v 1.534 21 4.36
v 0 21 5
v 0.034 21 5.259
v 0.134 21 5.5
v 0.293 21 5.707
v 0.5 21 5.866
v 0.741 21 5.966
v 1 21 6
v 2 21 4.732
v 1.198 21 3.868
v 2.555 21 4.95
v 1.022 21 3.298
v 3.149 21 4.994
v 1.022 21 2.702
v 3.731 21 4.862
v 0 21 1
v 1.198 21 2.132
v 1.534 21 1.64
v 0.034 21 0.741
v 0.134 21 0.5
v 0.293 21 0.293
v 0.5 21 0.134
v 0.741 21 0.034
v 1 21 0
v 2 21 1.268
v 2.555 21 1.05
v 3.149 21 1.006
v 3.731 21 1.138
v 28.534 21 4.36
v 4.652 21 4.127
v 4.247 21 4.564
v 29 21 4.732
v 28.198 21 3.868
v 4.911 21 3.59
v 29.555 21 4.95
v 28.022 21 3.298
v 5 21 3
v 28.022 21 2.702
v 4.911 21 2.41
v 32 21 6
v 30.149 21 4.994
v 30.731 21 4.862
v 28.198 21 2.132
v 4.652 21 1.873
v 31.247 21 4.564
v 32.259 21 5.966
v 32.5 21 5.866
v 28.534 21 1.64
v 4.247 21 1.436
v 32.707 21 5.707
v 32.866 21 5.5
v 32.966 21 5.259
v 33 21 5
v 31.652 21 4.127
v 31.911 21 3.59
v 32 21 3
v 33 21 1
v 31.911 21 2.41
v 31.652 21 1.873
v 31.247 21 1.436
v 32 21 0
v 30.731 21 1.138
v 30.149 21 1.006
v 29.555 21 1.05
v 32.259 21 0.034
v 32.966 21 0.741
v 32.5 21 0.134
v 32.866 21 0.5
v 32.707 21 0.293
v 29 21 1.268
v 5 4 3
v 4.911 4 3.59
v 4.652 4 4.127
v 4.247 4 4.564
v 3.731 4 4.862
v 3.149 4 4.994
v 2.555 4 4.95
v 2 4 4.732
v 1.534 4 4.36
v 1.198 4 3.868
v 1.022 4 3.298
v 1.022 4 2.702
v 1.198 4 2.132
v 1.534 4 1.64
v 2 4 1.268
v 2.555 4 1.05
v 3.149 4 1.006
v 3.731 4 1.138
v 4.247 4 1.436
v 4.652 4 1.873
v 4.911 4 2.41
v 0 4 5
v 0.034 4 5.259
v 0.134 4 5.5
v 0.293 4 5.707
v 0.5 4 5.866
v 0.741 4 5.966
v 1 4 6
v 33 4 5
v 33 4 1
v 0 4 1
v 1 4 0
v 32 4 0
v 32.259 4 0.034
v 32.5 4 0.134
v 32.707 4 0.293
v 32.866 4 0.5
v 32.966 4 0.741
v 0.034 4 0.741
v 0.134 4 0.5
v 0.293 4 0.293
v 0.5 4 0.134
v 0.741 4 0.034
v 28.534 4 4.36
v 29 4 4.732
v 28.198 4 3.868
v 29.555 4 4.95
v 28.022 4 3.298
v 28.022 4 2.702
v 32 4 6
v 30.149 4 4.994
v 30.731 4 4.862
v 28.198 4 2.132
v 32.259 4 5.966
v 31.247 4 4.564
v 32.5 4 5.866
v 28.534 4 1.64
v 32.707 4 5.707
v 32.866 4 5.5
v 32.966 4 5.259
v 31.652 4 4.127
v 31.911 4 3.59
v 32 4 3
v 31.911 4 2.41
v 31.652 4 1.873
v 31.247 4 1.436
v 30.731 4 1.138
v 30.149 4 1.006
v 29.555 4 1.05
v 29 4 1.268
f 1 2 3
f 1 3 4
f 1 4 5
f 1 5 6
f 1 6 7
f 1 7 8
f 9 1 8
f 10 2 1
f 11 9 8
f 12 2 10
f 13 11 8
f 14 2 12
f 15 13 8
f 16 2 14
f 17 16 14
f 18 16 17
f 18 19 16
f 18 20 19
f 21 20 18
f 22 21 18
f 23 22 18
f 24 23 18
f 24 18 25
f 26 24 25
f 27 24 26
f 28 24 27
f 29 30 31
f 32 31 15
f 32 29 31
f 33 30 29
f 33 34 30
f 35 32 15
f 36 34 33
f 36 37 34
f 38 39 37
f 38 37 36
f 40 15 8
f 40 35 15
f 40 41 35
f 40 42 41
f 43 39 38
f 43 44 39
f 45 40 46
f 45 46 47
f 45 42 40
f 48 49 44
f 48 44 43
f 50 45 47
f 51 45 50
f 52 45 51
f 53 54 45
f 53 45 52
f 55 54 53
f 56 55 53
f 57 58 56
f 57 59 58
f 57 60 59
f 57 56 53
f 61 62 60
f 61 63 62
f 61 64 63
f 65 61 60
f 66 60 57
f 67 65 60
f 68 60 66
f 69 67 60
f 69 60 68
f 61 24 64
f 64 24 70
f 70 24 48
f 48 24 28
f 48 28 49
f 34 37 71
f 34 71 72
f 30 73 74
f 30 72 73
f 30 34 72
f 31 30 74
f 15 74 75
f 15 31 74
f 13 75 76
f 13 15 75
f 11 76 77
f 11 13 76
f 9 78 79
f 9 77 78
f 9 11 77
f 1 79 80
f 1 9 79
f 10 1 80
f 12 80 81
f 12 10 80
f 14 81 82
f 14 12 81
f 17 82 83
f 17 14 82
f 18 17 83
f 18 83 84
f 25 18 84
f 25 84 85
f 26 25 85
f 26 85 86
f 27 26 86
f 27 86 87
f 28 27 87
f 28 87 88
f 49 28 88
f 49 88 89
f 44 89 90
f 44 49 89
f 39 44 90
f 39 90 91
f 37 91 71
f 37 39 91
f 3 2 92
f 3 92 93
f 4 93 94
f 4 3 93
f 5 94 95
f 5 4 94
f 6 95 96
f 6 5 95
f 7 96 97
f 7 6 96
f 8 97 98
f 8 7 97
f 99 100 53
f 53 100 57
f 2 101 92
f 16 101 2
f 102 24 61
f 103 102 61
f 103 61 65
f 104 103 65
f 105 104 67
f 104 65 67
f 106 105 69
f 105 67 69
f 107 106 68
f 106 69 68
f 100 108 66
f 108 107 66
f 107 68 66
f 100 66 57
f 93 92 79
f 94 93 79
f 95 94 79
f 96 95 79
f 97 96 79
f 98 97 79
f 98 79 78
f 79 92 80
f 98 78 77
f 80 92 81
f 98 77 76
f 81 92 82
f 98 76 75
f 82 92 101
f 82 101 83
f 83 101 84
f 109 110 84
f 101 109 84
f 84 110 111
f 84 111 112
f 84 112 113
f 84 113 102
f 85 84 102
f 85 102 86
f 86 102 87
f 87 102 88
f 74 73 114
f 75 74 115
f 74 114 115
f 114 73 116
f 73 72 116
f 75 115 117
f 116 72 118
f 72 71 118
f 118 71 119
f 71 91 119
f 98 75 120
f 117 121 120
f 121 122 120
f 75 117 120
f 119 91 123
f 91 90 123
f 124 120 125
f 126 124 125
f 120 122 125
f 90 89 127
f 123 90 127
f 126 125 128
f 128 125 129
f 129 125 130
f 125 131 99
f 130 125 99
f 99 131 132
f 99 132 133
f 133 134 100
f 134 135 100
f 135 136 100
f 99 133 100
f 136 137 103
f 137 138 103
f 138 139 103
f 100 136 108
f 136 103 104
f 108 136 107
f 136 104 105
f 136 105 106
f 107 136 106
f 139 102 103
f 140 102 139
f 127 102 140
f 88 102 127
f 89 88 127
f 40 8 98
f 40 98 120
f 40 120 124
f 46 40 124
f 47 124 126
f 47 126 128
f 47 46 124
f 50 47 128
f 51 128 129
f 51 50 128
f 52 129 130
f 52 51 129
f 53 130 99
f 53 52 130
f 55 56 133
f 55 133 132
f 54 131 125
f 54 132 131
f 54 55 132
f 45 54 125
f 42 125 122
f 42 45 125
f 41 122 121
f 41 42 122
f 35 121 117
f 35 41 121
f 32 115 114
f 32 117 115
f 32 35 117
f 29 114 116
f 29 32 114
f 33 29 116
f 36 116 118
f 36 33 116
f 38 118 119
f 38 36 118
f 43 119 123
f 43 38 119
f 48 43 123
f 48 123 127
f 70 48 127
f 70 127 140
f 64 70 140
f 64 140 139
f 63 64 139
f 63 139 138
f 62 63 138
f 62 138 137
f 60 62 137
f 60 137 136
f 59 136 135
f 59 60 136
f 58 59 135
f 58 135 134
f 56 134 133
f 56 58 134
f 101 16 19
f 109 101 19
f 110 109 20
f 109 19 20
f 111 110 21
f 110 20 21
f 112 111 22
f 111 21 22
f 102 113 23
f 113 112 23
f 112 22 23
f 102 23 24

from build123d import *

# Parameters (mm, degrees)
BOX001_W               = 50
BOX001_H               = 4
BOX001_DEPTH           = 10
CYLINDER002_R          = 2
CYLINDER002_DEPTH      = 30
CYLINDER002_ROLL_ANGLE = 90
CYLINDER001_R          = 2
CYLINDER001_DEPTH      = 30
CYLINDER001_ROLL_ANGLE = 90
CYLINDER_R             = 2
CYLINDER_DEPTH         = 30
CYLINDER_ROLL_ANGLE    = 90
BOX_W                  = 33
BOX_H                  = 21
BOX_DEPTH              = 6
FILLET_R               = 1


with BuildPart() as cube001:
    # Box001 → Box001 (new body)
    with BuildSketch(Plane.XY):
        with Locations((25, 2)):
            Rectangle(BOX001_W, BOX001_H)
    extrude(amount=BOX001_DEPTH)


with BuildPart() as cylinder002:
    # Cylinder002 → Cylinder002 (new body)
    with BuildSketch(Plane.XY):
        Circle(CYLINDER002_R)
    extrude(amount=CYLINDER002_DEPTH)


with BuildPart() as cylinder002_1:
    # Cylinder002 roll: moved
    add(cylinder002.part.rotate(Axis((0, 0, 0), (1, 0, 0)), CYLINDER002_ROLL_ANGLE))


with BuildPart() as cylinder002_2:
    # Cylinder002 placement: moved
    add(cylinder002_1.part.moved(Location((30, 27, 3))))


with BuildPart() as cylinder001:
    # Cylinder001 → Cylinder001 (new body)
    with BuildSketch(Plane.XY):
        Circle(CYLINDER001_R)
    extrude(amount=CYLINDER001_DEPTH)


with BuildPart() as cylinder001_1:
    # Cylinder001 roll: moved
    add(cylinder001.part.rotate(Axis((0, 0, 0), (1, 0, 0)), CYLINDER001_ROLL_ANGLE))


with BuildPart() as cylinder001_2:
    # Cylinder001 placement: moved
    add(cylinder001_1.part.moved(Location((3, 27, 3))))


with BuildPart() as cylinder:
    # Cylinder → Cylinder (new body)
    with BuildSketch(Plane.XY):
        Circle(CYLINDER_R)
    extrude(amount=CYLINDER_DEPTH)


with BuildPart() as cylinder_1:
    # Cylinder roll: moved
    add(cylinder.part.rotate(Axis((0, 0, 0), (1, 0, 0)), CYLINDER_ROLL_ANGLE))


with BuildPart() as cylinder_2:
    # Cylinder placement: moved
    add(cylinder_1.part.moved(Location((3, 27, 3))))


with BuildPart() as cut003:
    # Box → Box (new body)
    with BuildSketch(Plane.XY):
        with Locations((16.5, 10.5)):
            Rectangle(BOX_W, BOX_H)
    extrude(amount=BOX_DEPTH)

    # Cut: cut Cylinder
    add(cylinder_2.part, mode=Mode.SUBTRACT)

    # Cut001: cut Cylinder001
    add(cylinder001_2.part, mode=Mode.SUBTRACT)

    # Cut002: cut Cylinder002
    add(cylinder002_2.part, mode=Mode.SUBTRACT)

    # Fillet
    fillet_edges = [cut003.edges().sort_by_distance(p)[0] for p in [
        (0, 10.5, 6),
        (0, 10.5, 0),
        (33, 10.5, 6),
        (33, 10.5, 0),
    ]]
    fillet(fillet_edges, radius=FILLET_R)

    # Cut003: cut Cube001
    add(cube001.part, mode=Mode.SUBTRACT)


solid = cut003.part
